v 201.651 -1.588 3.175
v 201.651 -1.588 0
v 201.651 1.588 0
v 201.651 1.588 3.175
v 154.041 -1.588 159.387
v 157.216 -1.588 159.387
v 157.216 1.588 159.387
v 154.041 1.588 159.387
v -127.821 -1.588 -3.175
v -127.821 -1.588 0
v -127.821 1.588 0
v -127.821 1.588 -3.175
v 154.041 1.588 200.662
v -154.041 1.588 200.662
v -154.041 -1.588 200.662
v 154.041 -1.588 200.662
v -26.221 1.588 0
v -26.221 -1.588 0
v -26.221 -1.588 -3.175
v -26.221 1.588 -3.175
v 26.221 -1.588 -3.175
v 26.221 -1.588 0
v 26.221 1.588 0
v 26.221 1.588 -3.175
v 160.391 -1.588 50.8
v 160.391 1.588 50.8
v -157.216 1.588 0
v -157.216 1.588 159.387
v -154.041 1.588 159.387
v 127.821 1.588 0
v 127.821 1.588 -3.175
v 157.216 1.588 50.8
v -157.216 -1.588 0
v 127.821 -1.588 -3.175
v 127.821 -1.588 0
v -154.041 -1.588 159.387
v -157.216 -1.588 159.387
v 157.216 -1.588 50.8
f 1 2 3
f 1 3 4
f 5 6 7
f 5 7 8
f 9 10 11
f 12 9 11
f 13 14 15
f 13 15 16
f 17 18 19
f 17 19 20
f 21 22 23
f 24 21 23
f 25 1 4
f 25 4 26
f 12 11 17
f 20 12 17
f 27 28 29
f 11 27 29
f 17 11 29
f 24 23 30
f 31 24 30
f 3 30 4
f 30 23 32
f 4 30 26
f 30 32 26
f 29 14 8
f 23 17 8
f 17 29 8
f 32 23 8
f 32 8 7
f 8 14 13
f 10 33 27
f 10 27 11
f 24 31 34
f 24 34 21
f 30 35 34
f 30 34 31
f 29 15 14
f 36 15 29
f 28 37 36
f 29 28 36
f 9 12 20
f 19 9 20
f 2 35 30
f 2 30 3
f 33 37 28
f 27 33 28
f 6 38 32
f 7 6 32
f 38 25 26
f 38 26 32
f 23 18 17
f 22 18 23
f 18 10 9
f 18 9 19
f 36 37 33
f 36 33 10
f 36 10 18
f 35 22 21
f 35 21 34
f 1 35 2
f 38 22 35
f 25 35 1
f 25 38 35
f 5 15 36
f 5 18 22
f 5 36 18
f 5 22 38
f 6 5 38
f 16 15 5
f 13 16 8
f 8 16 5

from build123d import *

# Parameters (mm, degrees)
SKETCH1_W           = 314.43168
SKETCH1_H           = 3.175
BOSS_EXTRUDE1_DEPTH = 200.66180012
CUT_EXTRUDE2_START  = -3.175
SKETCH5_W           = 3.175
SKETCH5_H           = 41.275
CUT_EXTRUDE2_DEPTH  = 259.11040162
BOSS_EXTRUDE3_DEPTH = 3.175
SKETCH12_W          = 101.6
SKETCH12_H          = 3.175
BOSS_EXTRUDE5_DEPTH = 3.175


with BuildPart() as part:
    # Sketch1 → Boss-Extrude1 (new body)
    with BuildSketch(Plane.XY):
        Rectangle(SKETCH1_W, SKETCH1_H)
    extrude(amount=BOSS_EXTRUDE1_DEPTH)

    # Sketch5 → Cut-Extrude2 (cut)
    with BuildSketch(Plane(origin=(0, 1.5875, 0), x_dir=(1, 0, 0), z_dir=(0, 1, 0)).offset(CUT_EXTRUDE2_START)):
        with Locations((-155.62834, -180.02430012)):
            Rectangle(SKETCH5_W, SKETCH5_H)
    cut_extrude2 = extrude(amount=CUT_EXTRUDE2_DEPTH, mode=Mode.SUBTRACT)

    # Mirror1: Cut-Extrude2 across plane
    add(cut_extrude2.mirror(Plane(origin=(0, 0, 0), x_dir=(0, 0, 1), z_dir=(1, 0, 0))), mode=Mode.SUBTRACT)

    # Sketch10 → Boss-Extrude3 (add)
    with BuildSketch(Plane.XZ.offset(1.5875)):
        Polygon((201.6506, 0), (201.6506, 3.175), (160.39084, 50.8), (157.21584, 50.8), (157.21584, 0), align=None)
    extrude(amount=-BOSS_EXTRUDE3_DEPTH)

    # Sketch12 → Boss-Extrude5 (add)
    with BuildSketch(Plane(origin=(0, 0, 0), x_dir=(-1, 0, 0), z_dir=(0, 0, -1))):
        with Locations((-77.02050001, 0)):
            Rectangle(SKETCH12_W, SKETCH12_H)
    boss_extrude5 = extrude(amount=BOSS_EXTRUDE5_DEPTH)

    # Mirror2: Boss-Extrude5 across plane
    add(boss_extrude5.mirror(Plane(origin=(0, 0, 0), x_dir=(0, 0, 1), z_dir=(1, 0, 0))))


solid = part.part
